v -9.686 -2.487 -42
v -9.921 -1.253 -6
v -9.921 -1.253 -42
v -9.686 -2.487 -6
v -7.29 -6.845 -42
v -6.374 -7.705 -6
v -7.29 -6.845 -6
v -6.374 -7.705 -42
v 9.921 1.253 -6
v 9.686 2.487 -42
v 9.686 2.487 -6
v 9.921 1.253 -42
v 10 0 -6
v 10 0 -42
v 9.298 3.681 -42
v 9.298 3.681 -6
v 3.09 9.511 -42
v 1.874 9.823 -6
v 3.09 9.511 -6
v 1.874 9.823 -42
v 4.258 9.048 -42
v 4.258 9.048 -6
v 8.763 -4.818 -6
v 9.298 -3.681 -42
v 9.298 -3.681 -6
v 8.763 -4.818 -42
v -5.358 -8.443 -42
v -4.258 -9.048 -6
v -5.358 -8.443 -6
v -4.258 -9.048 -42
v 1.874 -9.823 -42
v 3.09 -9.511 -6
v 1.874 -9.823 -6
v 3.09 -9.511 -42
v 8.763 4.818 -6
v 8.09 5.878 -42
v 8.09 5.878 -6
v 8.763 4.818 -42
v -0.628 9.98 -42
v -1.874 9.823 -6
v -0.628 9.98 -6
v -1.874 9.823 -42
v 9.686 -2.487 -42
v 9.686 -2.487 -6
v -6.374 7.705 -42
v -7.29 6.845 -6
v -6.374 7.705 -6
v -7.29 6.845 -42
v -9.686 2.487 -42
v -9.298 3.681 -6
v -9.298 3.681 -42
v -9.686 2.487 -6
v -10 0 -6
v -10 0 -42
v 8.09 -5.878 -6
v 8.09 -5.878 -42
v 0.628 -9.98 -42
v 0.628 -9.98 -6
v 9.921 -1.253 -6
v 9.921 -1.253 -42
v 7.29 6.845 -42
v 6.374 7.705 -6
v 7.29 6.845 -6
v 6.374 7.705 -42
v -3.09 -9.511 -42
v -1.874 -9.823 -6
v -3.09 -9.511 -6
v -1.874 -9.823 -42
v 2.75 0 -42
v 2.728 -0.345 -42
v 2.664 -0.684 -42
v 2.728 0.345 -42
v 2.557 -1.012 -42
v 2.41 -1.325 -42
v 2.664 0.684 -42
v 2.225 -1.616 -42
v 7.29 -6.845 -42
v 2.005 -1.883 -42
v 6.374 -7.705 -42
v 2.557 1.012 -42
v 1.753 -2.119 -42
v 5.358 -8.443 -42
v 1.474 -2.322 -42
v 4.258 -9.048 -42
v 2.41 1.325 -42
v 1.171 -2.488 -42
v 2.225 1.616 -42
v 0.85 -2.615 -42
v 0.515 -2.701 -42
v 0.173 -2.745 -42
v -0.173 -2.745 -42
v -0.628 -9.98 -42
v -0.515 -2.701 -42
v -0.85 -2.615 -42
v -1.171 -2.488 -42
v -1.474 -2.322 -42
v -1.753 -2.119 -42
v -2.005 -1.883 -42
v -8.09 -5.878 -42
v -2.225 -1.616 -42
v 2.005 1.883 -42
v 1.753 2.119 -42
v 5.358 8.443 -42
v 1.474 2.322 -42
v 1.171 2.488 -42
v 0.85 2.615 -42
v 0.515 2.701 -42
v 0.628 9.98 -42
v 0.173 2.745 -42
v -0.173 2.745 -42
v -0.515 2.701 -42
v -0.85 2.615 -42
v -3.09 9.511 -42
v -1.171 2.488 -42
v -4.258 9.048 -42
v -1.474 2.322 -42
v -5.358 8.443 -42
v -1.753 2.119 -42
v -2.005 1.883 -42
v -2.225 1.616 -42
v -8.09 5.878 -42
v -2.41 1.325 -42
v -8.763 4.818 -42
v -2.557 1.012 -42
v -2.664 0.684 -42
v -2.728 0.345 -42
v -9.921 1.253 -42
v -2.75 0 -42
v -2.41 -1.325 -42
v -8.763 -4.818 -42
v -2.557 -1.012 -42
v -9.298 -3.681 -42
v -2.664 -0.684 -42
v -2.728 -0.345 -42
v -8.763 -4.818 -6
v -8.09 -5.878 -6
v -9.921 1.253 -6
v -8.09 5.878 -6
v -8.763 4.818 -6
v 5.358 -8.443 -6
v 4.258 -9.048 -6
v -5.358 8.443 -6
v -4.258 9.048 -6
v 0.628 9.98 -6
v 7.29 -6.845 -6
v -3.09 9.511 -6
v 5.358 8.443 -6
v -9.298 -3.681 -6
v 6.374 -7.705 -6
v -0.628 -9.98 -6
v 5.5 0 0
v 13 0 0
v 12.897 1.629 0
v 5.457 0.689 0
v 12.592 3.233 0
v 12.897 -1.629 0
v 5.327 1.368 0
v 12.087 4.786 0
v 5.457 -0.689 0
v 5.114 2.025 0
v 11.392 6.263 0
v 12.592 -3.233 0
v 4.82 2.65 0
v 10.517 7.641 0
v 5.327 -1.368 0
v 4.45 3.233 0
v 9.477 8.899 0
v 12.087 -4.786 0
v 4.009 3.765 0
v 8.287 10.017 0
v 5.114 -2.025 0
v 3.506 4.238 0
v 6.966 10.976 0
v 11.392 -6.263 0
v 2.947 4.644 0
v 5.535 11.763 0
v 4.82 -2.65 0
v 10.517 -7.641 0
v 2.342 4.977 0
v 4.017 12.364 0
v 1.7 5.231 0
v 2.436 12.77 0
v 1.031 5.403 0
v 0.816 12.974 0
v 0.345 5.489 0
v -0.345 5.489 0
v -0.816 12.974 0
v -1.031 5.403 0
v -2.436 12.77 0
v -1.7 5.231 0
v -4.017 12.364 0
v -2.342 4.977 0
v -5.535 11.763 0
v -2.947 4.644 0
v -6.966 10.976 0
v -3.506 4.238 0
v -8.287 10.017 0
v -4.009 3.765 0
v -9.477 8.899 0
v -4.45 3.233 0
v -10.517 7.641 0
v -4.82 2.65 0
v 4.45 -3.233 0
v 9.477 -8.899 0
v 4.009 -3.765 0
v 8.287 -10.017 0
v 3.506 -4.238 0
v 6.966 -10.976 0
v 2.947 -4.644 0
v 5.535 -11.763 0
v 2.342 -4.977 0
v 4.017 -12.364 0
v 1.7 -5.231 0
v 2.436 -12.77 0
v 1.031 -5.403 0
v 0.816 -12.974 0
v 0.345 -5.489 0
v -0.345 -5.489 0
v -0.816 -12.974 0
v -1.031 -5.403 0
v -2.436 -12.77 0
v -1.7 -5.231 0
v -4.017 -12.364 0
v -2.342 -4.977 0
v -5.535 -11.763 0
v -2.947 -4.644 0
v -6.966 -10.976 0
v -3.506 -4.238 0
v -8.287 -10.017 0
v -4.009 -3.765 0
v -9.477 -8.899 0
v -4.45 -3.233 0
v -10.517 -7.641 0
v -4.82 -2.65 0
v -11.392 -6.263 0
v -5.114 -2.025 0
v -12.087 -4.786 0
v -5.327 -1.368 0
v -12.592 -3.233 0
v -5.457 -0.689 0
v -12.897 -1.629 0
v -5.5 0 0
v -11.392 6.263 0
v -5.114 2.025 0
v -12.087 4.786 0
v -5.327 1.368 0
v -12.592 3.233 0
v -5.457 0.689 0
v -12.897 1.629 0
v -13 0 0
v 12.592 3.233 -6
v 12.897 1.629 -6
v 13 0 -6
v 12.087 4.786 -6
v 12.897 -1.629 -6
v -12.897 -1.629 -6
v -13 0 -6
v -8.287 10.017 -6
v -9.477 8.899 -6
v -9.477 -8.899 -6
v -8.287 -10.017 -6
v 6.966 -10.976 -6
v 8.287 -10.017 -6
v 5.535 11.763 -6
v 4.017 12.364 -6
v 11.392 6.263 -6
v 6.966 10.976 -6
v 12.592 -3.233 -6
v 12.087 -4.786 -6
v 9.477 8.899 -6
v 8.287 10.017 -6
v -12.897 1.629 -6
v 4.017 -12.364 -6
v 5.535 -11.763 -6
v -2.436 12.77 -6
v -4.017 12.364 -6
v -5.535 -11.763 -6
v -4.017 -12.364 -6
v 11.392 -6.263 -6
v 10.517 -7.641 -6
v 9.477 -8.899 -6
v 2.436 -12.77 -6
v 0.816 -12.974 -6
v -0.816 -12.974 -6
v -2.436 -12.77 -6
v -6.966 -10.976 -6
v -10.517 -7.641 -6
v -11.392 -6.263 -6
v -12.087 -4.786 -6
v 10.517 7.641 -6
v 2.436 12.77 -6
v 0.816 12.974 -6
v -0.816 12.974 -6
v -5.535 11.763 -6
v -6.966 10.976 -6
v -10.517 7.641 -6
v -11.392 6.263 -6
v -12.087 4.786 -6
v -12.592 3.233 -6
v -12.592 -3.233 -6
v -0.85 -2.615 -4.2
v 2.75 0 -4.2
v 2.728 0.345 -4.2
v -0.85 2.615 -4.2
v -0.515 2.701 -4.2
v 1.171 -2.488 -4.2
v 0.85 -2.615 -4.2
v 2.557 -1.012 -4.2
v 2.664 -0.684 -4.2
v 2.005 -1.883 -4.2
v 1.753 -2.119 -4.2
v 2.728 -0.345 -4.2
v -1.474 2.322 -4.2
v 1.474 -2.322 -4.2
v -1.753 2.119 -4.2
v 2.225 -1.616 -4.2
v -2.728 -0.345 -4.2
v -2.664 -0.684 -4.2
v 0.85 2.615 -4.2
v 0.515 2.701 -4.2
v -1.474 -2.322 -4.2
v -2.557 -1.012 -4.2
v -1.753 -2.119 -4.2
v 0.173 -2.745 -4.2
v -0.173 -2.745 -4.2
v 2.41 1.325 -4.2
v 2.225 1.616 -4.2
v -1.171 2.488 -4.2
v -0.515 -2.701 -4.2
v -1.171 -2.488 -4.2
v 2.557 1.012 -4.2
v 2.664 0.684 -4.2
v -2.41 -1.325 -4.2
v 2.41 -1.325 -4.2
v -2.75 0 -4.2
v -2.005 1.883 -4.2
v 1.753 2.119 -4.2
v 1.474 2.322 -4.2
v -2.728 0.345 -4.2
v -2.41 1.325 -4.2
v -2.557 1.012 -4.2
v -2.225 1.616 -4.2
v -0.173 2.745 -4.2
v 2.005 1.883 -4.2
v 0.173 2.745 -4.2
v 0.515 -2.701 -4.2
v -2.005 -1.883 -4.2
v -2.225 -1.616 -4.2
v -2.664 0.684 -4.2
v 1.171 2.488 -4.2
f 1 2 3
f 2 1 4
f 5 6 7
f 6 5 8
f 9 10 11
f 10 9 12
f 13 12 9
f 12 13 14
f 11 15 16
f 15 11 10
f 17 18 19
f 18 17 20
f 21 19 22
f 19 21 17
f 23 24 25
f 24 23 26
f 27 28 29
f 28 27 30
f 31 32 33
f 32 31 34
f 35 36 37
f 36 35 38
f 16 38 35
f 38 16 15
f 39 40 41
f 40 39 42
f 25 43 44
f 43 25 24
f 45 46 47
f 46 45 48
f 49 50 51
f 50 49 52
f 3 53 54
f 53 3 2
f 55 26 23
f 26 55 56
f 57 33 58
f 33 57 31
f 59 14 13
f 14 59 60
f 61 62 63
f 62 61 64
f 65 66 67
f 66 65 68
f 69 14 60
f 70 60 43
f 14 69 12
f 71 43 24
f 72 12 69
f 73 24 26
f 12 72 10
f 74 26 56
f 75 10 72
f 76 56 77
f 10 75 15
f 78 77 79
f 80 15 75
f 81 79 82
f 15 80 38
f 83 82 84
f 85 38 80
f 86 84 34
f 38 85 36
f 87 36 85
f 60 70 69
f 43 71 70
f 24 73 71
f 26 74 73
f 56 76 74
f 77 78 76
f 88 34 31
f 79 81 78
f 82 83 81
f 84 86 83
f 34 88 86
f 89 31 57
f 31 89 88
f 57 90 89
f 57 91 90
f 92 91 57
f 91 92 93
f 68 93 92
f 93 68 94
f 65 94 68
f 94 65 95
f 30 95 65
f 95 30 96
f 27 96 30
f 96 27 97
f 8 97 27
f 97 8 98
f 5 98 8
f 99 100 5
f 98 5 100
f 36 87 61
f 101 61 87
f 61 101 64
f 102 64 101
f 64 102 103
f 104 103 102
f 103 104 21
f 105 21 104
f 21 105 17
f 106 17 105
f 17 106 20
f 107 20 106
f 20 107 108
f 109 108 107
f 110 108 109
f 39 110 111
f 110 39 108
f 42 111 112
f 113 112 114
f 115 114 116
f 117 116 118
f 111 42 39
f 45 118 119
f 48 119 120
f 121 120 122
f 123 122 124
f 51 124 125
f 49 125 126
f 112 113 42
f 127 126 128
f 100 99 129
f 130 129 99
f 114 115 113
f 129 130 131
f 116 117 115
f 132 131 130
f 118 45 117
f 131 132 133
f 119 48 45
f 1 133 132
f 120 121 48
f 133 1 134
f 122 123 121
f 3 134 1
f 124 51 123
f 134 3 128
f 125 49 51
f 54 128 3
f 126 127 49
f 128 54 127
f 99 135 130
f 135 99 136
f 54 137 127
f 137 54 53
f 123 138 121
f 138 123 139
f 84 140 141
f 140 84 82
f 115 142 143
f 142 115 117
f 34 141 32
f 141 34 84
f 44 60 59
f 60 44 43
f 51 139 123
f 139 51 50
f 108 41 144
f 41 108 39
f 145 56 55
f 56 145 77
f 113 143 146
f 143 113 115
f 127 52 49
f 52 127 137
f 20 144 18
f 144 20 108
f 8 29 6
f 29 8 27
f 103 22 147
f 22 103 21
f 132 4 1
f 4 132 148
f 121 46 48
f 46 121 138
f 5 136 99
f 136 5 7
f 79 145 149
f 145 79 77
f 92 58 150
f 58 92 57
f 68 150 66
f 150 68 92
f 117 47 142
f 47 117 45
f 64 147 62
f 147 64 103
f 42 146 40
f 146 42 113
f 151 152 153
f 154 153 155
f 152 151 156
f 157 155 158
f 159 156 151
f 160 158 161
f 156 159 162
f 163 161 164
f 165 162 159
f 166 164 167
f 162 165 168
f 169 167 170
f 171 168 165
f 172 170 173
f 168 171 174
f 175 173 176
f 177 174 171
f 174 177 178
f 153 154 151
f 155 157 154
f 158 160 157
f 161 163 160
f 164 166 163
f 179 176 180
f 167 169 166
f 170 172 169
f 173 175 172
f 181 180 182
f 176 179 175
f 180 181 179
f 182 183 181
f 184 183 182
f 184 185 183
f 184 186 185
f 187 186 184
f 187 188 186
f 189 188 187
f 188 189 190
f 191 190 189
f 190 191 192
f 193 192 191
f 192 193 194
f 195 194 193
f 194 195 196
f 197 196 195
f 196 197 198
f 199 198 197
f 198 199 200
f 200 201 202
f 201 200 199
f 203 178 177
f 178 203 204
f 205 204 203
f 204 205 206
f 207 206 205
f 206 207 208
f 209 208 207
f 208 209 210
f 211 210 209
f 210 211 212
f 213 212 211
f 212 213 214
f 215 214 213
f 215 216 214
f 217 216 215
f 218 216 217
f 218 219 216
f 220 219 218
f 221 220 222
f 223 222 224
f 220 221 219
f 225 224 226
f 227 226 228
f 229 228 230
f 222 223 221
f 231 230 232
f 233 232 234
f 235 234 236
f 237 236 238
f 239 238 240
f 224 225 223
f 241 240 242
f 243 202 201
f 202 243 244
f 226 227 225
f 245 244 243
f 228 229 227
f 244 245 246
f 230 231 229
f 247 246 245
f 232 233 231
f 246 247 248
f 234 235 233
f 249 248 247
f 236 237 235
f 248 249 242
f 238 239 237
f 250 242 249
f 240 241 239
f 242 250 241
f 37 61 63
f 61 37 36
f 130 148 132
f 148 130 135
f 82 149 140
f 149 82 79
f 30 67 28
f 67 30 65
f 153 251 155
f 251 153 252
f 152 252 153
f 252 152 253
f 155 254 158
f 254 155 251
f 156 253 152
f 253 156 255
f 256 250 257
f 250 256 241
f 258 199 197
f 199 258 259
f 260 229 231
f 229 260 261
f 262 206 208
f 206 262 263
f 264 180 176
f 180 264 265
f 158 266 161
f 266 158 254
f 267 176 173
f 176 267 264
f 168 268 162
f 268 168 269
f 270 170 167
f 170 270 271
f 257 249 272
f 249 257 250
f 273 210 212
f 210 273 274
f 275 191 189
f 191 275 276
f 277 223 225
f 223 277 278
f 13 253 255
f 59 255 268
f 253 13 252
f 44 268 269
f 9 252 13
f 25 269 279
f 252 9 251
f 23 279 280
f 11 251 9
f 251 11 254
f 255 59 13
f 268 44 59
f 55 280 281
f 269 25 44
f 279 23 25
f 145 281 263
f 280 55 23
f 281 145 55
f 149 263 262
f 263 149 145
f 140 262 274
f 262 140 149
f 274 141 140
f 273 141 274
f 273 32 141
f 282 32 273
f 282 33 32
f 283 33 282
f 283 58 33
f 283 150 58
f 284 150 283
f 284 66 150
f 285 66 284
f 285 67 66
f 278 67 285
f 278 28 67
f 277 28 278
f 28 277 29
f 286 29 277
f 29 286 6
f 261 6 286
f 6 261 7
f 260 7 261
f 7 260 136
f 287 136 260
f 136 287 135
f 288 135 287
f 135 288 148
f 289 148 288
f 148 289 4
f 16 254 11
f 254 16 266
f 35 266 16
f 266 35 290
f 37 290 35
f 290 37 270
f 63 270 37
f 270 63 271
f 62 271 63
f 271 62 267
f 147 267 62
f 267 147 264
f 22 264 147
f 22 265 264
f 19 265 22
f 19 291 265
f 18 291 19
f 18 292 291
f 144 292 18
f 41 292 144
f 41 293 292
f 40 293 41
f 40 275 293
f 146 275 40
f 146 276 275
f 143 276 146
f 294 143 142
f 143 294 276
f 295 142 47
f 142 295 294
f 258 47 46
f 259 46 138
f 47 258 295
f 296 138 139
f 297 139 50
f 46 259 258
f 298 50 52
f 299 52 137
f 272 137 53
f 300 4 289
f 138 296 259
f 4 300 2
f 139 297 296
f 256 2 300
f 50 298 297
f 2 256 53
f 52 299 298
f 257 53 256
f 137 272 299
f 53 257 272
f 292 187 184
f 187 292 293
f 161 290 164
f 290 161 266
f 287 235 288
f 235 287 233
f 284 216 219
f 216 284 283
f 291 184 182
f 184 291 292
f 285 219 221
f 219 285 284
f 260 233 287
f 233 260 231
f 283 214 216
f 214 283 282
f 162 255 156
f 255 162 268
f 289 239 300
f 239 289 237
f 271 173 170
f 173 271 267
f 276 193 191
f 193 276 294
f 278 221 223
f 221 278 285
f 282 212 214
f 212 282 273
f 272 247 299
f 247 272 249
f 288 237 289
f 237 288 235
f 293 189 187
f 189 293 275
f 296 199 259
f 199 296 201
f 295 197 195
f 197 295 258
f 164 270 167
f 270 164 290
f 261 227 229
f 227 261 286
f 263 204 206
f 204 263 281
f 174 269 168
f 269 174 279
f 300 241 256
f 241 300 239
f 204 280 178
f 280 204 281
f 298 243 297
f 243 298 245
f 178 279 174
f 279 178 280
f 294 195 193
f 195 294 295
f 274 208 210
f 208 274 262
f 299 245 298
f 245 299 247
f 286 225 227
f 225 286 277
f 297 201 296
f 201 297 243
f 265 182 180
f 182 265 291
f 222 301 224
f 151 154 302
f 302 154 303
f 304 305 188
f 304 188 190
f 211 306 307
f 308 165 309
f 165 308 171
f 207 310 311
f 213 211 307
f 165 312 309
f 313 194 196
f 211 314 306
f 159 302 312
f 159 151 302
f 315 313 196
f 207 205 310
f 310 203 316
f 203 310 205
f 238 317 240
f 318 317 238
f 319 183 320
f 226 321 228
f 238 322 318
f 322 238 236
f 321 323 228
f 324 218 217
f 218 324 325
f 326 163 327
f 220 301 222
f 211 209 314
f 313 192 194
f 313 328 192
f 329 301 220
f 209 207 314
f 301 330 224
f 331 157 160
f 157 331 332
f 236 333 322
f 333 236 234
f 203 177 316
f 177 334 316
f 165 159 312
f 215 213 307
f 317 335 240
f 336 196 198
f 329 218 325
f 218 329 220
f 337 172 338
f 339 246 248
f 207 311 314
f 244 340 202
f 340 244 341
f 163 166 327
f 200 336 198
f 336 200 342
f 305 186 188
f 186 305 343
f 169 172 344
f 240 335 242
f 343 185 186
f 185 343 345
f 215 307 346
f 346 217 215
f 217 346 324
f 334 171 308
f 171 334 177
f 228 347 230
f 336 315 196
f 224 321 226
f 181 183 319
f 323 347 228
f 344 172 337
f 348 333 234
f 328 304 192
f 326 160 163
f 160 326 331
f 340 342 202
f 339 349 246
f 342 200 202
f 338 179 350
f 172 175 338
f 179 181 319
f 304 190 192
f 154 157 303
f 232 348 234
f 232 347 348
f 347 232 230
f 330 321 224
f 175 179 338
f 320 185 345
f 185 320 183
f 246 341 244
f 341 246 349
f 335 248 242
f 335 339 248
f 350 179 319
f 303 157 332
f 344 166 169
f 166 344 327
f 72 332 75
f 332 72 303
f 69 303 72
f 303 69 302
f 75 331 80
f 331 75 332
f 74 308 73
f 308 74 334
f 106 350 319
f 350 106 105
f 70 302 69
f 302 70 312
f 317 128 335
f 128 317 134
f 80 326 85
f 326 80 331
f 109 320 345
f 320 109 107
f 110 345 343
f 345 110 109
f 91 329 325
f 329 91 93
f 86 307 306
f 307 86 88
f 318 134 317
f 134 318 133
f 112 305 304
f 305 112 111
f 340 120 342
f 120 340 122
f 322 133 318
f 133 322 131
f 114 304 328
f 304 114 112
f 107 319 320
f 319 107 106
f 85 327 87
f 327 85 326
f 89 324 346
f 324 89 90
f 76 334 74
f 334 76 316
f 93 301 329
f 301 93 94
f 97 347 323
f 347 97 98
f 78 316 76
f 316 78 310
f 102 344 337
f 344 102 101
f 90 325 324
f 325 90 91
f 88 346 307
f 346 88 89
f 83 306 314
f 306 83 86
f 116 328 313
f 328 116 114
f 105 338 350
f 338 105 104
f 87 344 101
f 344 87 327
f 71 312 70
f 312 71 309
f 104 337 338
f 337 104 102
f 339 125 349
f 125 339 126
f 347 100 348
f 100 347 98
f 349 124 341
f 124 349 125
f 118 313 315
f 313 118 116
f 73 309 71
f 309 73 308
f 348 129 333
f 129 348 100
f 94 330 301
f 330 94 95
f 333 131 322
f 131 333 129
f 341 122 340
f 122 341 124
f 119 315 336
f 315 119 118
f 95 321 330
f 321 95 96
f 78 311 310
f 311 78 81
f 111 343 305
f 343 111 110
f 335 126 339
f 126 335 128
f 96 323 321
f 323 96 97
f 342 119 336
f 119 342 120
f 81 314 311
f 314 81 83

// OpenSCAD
$fn = 50;


difference() {
	union() {
		translate(v = [0, 0, -42.0000000000]) {
			cylinder(h = 42, r = 10.0000000000);
		}
		translate(v = [0, 0, -6.0000000000]) {
			cylinder(h = 6, r = 13.0000000000);
		}
	}
	union() {
		translate(v = [0, 0, 0]) {
			rotate(a = [0, 0, 0]) {
				difference() {
					union() {
						#translate(v = [0, 0, -42.0000000000]) {
							cylinder(h = 42, r = 2.2500000000);
						}
						#translate(v = [0, 0, -4.2000000000]) {
							cylinder(h = 4.2000000000, r = 10.0000000000, r1 = 2.7500000000, r2 = 5.5000000000);
						}
						#translate(v = [0, 0, -42.0000000000]) {
							cylinder(h = 42, r = 2.7500000000);
						}
						#translate(v = [0, 0, -42.0000000000]) {
							cylinder(h = 42, r = 2.2500000000);
						}
					}
					union();
				}
			}
		}
	}
}
